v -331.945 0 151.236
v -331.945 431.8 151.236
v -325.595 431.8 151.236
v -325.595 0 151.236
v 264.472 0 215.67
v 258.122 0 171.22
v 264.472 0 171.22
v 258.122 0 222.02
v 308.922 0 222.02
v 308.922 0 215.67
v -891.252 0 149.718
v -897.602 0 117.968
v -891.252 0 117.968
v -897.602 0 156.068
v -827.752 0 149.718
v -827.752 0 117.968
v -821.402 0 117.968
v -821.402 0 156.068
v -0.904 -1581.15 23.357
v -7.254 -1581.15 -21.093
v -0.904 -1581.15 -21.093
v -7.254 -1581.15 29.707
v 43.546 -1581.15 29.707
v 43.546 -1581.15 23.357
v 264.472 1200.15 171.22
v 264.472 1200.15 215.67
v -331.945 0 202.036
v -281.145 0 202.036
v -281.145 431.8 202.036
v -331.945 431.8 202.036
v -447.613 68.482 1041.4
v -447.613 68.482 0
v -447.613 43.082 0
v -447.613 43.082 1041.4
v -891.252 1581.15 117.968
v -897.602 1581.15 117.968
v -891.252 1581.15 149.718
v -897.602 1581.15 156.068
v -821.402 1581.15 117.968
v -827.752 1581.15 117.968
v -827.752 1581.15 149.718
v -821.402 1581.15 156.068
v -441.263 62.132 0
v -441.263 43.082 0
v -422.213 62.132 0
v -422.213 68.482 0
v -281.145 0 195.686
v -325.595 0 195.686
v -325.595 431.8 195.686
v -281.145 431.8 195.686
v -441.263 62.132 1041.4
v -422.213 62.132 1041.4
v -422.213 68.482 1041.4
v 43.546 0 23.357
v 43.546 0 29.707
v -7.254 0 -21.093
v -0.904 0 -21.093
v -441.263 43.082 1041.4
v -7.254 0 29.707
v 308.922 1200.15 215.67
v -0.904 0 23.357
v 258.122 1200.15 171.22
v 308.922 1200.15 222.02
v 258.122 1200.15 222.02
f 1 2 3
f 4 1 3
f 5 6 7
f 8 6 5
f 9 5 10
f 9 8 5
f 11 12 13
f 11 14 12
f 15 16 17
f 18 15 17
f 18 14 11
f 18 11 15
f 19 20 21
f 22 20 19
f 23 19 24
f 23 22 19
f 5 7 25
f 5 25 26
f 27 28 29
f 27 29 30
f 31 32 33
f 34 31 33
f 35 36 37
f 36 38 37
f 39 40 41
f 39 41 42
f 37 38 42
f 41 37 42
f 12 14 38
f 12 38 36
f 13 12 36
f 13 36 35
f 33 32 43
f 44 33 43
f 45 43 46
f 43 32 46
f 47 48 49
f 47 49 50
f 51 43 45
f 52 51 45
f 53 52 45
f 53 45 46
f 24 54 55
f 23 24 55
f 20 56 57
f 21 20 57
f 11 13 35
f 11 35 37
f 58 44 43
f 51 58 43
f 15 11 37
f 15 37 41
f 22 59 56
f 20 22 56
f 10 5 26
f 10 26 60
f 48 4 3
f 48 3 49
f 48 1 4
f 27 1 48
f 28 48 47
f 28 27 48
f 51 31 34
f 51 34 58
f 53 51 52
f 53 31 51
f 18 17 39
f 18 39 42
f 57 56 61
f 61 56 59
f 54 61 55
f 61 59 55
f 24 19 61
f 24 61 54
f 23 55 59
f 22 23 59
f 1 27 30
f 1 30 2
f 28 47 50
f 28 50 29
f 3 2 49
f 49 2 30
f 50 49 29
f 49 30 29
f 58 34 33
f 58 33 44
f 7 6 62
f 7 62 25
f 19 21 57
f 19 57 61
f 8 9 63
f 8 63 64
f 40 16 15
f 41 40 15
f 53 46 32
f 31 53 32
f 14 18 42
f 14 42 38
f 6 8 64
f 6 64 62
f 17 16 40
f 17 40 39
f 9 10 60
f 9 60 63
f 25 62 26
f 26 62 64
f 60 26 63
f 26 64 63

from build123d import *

# Parameters (mm, degrees)
F0_W     = 44.45
F0_H     = 6.35
F1_DEPTH = 1581.15
F2_W     = 19.05
F2_H     = 6.35
F3_DEPTH = 1041.4
F4_W     = 44.45
F4_H     = 6.35
F5_DEPTH = 431.8
F6_W     = 44.45
F6_H     = 6.35
F7_DEPTH = 1200.15
F8_W     = 6.35
F8_H     = 31.75
F9_DEPTH = 1581.15


with BuildPart() as f1:
    # F0 (on Front) → F1 (new body)
    with BuildSketch(Plane.XZ):
        Polygon((-7.253912, 29.706775), (-7.253912, -21.093225), (-0.903912, -21.093225), (-0.903912, 23.356775), (-0.903912, 29.706775), align=None)
        with Locations((21.321088, 26.531775)):
            Rectangle(F0_W, F0_H)
    extrude(amount=F1_DEPTH)


with BuildPart() as f3:
    # F2 (on Top) → F3 (new body)
    with BuildSketch(Plane.XY):
        with Locations((-431.738131, 65.306978)):
            Rectangle(F2_W, F2_H)
        Polygon((-441.263131, 68.481978), (-447.613131, 68.481978), (-447.613131, 43.081978), (-441.263131, 43.081978), (-441.263131, 62.131978), align=None)
    extrude(amount=F3_DEPTH)


with BuildPart() as f5:
    # F4 (on Front) → F5 (new body)
    with BuildSketch(Plane.XZ):
        with Locations((-303.369573, 198.860992)):
            Rectangle(F4_W, F4_H)
        Polygon((-331.944573, 202.035992), (-331.944573, 151.235992), (-325.594573, 151.235992), (-325.594573, 195.685992), (-325.594573, 202.035992), align=None)
    extrude(amount=-F5_DEPTH)


with BuildPart() as f7:
    # F6 (on Front) → F7 (new body)
    with BuildSketch(Plane.XZ):
        Polygon((258.122068, 222.020356), (258.122068, 171.220356), (264.472068, 171.220356), (264.472068, 215.670356), (264.472068, 222.020356), align=None)
        with Locations((286.697068, 218.845356)):
            Rectangle(F6_W, F6_H)
    extrude(amount=-F7_DEPTH)


with BuildPart() as f9:
    # F8 (on Front) → F9 (new body)
    with BuildSketch(Plane.XZ):
        with Locations((-894.427203, 133.843211)):
            Rectangle(F8_W, F8_H)
        Polygon((-821.402203, 156.068211), (-897.602203, 156.068211), (-897.602203, 149.718211), (-891.252203, 149.718211), (-827.752203, 149.718211), (-821.402203, 149.718211), align=None)
        with Locations((-824.577203, 133.843211)):
            Rectangle(F8_W, F8_H)
    extrude(amount=-F9_DEPTH)


solid = Compound([f1.part, f3.part, f5.part, f7.part, f9.part])
